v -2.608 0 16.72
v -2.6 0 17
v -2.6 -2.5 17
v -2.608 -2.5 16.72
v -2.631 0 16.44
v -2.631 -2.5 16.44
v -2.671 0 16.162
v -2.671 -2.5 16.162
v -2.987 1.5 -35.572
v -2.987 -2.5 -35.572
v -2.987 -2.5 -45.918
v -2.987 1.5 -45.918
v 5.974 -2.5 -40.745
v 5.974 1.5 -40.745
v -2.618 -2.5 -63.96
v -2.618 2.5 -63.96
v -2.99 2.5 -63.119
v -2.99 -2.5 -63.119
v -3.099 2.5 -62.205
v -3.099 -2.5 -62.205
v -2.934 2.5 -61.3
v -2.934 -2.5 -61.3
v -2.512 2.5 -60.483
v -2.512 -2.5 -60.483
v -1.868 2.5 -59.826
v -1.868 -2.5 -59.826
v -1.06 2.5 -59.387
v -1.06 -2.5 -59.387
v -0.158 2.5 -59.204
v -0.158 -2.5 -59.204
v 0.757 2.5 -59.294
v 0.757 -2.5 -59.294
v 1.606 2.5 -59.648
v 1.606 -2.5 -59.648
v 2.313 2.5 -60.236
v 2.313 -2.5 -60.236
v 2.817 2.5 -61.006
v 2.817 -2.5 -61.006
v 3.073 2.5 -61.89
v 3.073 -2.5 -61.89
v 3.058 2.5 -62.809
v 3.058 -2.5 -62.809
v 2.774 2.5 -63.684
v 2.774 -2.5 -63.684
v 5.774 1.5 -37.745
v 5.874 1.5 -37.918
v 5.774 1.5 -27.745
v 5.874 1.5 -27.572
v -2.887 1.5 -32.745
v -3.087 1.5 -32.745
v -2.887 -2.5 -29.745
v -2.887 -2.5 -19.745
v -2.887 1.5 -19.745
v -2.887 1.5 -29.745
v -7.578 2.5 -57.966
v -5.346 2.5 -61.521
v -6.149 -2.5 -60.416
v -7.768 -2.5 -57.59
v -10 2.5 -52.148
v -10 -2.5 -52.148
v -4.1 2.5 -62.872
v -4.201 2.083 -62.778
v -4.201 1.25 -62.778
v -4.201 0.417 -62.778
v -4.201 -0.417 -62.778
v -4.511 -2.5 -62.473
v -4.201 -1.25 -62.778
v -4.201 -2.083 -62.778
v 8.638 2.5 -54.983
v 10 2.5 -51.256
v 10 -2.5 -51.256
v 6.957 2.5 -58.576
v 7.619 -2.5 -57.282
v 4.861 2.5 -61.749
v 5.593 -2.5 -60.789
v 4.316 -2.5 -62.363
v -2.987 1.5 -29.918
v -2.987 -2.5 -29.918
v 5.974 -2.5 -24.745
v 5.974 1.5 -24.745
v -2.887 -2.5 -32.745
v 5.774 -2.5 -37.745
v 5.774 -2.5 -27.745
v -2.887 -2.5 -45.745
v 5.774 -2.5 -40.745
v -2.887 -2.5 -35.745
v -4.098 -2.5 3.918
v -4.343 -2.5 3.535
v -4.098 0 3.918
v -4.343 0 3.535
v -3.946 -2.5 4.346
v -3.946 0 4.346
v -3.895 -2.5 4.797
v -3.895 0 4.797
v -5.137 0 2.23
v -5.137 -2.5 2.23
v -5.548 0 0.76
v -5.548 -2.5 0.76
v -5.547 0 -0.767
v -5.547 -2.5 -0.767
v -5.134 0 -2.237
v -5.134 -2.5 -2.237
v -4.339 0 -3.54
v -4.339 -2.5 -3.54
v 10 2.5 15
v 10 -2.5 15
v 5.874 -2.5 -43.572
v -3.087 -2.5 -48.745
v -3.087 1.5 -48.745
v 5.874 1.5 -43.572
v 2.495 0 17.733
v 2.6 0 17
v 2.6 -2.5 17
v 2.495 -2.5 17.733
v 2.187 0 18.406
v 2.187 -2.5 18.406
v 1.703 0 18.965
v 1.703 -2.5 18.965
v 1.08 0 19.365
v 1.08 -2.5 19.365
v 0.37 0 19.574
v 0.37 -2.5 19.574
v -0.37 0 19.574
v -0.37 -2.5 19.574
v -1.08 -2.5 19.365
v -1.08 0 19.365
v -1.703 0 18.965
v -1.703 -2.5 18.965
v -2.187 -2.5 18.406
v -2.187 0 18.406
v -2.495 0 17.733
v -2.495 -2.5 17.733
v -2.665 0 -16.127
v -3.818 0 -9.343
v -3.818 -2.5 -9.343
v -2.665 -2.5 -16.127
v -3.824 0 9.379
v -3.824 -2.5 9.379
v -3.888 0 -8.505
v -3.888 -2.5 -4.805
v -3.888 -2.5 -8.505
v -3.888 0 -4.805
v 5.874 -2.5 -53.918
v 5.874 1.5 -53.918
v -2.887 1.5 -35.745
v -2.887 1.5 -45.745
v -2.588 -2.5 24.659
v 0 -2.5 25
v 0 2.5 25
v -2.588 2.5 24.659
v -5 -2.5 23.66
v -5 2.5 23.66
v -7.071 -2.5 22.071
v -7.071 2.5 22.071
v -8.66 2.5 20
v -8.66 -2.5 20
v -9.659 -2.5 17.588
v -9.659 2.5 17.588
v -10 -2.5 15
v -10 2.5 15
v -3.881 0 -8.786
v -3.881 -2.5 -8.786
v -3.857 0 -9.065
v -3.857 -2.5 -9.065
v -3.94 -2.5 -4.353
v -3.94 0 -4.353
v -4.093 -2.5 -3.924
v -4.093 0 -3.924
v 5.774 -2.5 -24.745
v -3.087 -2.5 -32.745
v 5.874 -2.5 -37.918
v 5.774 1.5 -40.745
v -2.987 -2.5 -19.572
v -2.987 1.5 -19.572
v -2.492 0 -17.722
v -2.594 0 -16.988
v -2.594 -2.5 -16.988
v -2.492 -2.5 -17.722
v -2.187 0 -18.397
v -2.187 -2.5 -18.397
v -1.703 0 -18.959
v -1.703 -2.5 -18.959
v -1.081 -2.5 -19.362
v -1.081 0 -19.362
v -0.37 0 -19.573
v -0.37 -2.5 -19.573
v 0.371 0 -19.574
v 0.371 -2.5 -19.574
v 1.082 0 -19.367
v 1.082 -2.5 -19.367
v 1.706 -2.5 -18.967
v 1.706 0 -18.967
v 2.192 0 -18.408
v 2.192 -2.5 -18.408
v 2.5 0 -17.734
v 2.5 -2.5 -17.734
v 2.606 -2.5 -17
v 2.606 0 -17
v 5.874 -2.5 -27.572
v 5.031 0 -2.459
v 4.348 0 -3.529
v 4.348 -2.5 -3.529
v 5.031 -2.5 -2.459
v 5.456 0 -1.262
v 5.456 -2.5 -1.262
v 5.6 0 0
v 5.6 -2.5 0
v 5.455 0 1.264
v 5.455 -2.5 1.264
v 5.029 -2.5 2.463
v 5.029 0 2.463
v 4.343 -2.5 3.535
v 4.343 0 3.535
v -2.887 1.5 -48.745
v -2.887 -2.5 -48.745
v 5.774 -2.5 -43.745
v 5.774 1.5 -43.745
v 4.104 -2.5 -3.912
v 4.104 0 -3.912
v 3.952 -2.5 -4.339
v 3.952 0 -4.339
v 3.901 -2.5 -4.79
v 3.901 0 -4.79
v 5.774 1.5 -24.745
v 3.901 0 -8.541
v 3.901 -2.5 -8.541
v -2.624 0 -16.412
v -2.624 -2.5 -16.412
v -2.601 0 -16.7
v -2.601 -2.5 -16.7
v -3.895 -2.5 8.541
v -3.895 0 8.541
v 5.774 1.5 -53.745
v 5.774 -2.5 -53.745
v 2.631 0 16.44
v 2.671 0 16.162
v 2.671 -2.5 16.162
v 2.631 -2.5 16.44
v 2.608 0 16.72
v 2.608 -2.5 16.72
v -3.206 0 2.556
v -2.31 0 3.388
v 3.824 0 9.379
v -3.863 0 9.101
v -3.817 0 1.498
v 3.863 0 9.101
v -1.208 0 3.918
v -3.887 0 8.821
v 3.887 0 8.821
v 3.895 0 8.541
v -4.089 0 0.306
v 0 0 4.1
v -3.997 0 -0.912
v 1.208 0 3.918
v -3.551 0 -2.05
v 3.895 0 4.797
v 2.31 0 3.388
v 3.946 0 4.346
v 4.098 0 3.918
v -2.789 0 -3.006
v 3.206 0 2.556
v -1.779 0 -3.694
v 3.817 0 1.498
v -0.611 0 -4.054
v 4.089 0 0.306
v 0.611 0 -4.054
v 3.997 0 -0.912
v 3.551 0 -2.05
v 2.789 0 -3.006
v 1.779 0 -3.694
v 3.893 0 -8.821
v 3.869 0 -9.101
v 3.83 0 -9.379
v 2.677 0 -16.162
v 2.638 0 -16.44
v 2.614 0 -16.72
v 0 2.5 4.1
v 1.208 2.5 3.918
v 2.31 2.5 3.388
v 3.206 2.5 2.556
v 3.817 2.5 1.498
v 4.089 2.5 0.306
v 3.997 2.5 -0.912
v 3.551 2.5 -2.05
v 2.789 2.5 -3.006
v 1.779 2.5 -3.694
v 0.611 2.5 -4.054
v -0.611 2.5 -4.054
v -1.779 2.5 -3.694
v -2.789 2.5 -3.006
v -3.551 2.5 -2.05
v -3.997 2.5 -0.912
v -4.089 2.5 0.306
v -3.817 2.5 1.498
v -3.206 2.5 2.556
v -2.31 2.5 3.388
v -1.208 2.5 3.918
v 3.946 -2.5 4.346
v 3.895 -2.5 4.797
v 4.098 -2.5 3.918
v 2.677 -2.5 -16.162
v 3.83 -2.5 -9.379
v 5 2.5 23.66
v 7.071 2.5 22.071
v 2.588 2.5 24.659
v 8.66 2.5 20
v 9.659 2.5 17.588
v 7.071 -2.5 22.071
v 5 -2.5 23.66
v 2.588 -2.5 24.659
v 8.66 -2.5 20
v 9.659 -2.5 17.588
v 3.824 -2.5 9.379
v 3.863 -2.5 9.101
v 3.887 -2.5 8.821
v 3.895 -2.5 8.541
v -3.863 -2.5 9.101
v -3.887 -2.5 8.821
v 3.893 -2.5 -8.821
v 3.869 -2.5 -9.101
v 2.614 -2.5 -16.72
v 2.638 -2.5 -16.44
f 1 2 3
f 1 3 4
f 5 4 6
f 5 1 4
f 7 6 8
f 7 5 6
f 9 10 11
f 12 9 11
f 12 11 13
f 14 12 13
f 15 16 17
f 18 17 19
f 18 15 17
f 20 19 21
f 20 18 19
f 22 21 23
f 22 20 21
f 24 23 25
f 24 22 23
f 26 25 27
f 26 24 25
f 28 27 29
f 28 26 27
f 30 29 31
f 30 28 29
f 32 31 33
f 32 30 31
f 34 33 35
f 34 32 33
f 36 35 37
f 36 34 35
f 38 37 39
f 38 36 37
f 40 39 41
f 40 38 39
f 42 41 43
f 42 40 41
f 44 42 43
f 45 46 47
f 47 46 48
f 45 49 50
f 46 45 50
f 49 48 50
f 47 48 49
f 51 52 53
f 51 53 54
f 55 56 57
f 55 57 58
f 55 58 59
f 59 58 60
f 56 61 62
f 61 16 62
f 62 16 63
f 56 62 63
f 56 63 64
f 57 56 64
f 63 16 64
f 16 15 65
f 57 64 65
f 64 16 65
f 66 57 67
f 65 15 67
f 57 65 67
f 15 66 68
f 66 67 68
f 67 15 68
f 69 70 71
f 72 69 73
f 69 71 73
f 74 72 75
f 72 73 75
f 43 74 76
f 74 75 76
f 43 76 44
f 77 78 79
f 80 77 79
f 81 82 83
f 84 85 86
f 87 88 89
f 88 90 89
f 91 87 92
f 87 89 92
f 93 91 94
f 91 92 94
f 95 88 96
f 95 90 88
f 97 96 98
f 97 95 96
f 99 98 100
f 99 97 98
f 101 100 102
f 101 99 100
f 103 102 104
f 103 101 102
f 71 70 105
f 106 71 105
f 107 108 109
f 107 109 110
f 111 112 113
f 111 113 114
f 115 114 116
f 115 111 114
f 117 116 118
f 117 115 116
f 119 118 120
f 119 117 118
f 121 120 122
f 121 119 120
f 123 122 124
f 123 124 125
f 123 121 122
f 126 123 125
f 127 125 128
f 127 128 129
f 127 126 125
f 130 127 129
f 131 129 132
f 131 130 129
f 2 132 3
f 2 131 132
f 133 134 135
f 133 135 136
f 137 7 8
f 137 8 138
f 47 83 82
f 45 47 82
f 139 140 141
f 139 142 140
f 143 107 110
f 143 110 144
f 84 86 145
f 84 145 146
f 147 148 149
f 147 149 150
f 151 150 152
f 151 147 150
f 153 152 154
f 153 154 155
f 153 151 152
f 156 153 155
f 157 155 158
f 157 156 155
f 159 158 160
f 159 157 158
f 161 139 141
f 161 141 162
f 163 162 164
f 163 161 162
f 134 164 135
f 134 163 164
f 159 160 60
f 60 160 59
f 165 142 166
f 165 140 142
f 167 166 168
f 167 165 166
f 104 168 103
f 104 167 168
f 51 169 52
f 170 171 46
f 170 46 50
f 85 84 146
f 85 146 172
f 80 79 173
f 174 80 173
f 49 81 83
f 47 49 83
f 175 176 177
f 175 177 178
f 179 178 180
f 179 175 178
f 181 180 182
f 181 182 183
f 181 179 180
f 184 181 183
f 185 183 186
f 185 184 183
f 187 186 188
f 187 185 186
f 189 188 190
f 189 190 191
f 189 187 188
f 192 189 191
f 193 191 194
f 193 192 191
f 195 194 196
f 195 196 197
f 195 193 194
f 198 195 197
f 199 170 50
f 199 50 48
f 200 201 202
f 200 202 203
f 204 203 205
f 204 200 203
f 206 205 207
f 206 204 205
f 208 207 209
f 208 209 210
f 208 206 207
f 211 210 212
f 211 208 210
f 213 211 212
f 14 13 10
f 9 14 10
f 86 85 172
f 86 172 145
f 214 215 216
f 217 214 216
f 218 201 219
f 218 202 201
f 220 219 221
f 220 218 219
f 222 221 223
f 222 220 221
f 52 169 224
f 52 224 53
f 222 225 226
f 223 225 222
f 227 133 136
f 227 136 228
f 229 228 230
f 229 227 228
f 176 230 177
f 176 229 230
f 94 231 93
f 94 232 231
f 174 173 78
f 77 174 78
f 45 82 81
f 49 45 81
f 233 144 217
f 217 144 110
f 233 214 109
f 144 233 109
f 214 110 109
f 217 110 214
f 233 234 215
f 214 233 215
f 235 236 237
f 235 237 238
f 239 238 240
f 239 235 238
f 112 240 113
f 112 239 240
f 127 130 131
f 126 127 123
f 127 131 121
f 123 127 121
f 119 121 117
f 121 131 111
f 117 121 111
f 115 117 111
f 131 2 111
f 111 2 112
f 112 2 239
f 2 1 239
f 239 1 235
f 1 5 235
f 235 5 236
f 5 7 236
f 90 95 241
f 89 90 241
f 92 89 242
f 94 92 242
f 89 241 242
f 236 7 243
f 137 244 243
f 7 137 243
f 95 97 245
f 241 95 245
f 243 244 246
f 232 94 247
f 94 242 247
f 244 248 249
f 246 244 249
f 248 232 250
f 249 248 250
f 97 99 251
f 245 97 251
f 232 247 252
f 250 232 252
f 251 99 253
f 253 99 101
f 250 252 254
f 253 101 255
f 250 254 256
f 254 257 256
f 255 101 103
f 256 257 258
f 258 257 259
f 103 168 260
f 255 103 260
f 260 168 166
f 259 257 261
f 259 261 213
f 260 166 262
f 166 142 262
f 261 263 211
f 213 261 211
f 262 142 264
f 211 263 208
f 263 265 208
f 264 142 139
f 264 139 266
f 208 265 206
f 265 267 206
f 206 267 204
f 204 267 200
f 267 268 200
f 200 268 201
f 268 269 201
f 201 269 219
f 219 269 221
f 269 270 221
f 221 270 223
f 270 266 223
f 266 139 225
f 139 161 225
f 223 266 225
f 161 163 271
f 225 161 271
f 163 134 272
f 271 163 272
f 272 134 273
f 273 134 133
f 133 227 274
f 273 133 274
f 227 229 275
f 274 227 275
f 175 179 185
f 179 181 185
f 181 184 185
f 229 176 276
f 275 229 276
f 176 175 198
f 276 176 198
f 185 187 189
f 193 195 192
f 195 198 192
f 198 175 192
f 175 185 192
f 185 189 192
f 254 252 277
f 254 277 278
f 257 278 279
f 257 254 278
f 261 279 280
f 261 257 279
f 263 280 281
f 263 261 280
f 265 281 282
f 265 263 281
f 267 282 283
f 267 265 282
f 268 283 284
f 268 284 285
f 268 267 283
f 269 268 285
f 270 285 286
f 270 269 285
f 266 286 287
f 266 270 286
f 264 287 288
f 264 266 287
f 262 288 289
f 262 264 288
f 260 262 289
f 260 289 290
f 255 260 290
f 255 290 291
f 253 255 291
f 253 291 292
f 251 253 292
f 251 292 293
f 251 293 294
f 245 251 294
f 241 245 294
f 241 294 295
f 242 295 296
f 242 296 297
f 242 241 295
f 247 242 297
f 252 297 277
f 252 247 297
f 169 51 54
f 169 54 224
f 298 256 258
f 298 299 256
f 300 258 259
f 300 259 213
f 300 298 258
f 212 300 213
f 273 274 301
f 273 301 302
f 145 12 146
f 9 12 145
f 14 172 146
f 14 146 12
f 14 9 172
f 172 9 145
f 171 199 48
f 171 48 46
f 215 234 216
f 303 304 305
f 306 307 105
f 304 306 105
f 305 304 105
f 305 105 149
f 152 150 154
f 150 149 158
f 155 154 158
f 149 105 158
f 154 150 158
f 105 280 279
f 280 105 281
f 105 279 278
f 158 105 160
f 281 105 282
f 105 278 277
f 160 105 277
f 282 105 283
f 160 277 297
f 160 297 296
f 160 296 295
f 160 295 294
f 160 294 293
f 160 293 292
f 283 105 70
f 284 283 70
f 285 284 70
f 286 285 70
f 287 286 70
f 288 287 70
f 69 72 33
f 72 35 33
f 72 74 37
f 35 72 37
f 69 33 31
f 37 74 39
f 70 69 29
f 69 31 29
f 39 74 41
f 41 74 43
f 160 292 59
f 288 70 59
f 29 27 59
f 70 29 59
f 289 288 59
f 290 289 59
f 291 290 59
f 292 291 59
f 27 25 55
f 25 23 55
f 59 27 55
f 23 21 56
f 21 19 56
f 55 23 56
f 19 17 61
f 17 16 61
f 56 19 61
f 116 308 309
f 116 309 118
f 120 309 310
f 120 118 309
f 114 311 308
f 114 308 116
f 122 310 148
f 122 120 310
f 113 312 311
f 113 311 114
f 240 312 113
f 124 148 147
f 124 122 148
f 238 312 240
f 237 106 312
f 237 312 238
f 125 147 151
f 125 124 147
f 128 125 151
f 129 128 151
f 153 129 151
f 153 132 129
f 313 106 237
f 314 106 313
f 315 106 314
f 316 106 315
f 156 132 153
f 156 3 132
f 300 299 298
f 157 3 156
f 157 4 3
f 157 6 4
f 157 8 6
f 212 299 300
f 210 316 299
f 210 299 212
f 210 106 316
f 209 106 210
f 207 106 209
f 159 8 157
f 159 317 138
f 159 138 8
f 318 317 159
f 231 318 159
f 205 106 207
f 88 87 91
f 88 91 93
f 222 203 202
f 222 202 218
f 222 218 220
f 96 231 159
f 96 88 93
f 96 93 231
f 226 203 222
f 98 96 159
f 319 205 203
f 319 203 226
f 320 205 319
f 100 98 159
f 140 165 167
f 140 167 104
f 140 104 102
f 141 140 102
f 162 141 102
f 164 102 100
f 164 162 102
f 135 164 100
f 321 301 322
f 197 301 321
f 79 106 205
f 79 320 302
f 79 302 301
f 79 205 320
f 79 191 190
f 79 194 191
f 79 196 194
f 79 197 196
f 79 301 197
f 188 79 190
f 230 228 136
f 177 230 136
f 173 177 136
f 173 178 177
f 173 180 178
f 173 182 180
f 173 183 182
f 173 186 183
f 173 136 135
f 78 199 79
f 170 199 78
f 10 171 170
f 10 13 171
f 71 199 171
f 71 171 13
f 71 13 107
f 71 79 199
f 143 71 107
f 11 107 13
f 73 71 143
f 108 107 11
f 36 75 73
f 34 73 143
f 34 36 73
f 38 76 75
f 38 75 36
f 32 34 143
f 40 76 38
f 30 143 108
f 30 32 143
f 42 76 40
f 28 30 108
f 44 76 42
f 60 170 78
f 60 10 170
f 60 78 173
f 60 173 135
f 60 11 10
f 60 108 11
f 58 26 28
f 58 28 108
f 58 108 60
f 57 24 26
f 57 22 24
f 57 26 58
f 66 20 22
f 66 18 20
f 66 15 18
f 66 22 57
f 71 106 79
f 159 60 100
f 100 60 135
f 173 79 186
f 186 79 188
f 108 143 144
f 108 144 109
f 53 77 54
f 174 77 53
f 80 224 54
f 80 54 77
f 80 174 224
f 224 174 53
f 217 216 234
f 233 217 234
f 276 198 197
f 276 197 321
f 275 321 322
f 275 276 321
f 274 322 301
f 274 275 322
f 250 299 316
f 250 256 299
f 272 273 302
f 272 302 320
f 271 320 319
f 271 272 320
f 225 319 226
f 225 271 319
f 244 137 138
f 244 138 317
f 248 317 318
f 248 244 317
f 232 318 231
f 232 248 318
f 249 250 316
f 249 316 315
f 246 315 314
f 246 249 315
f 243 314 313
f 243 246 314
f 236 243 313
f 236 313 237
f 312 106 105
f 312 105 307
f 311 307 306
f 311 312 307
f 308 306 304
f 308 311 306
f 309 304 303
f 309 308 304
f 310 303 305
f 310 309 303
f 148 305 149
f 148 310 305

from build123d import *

# Parameters (mm, degrees)
SKETCH1_W           = 15
SKETCH1_H           = 45
BOSS_EXTRUDE1_DEPTH = 2.2
SKETCH1_3_W         = 20
SKETCH1_3_H         = 50
SKETCH1_3_W_2       = 15
SKETCH1_3_H_2       = 45
BOSS_EXTRUDE2_DEPTH = 2.5
SKETCH1_4_W         = 20
SKETCH1_4_H         = 50
SKETCH1_4_R         = 4.1
BOSS_EXTRUDE3_DEPTH = 2.5
FILLET1_R           = 2
SKETCH1_5_R         = 3.1
BOSS_EXTRUDE4_DEPTH = 2.5
FILLET2_R           = 10
CUT_EXTRUDE2_DEPTH  = 4
SKETCH3_OUTSIDE_W   = 41.892
SKETCH3_OUTSIDE_H   = 119.192
CUT_EXTRUDE3_DEPTH  = 74.159346635


with BuildPart() as part:
    # Sketch1 → Boss-Extrude1 (new body)
    with BuildSketch(Plane(origin=(0, 0, 0), x_dir=(1, 0, 0), z_dir=(0, 1, 0))):
        Rectangle(SKETCH1_W, SKETCH1_H)
        with BuildLine():
            ThreePointArc((-3.894544437, -4.023993492), (-5.599998379, 0.004260474), (-3.88841703, 4.029914763))
            Line((-3.88841703, 4.029914763), (-3.88841703, 8.505312122))
            ThreePointArc((-3.88841703, 8.505312122), (-3.870707724, 8.925763598), (-3.817705253, 9.343236712))
            Line((-3.817705253, 9.343236712), (-2.664584371, 16.126741161))
            ThreePointArc((-2.664584371, 16.126741161), (-2.610617779, 16.555799687), (-2.593926654, 16.987916591))
            ThreePointArc((-2.593926654, 16.987916591), (0, 19.6), (2.606045235, 17.000007028))
            ThreePointArc((2.606045235, 17.000007028), (2.623754541, 16.579555552), (2.676757012, 16.162082438))
            Line((2.676757012, 16.162082438), (3.829877895, 9.378577989))
            ThreePointArc((3.829877895, 9.378577989), (3.882880366, 8.961104875), (3.900589672, 8.540653399))
            Line((3.900589672, 8.540653399), (3.900589672, 4.018133922))
            ThreePointArc((3.900589672, 4.018133922), (5.157678846, 2.181364004), (5.6, 0))
            ThreePointArc((5.6, 0), (5.156037667, -2.185240393), (3.894544437, -4.023993492))
            Line((3.894544437, -4.023993492), (3.894544437, -8.540646372))
            ThreePointArc((3.894544437, -8.540646372), (3.876835131, -8.961097847), (3.82383266, -9.378570962))
            Line((3.82383266, -9.378570962), (2.670711777, -16.16207541))
            ThreePointArc((2.670711777, -16.16207541), (2.617709306, -16.579548524), (2.6, -17))
            ThreePointArc((2.6, -17), (0, -19.6), (-2.6, -17))
            ThreePointArc((-2.6, -17), (-2.617709306, -16.579548524), (-2.670711777, -16.16207541))
            Line((-2.670711777, -16.16207541), (-3.82383266, -9.378570962))
            ThreePointArc((-3.82383266, -9.378570962), (-3.876835131, -8.961097847), (-3.894544437, -8.540646372))
            Line((-3.894544437, -8.540646372), (-3.894544437, -4.023993492))
        make_face(mode=Mode.SUBTRACT)
    extrude(amount=-BOSS_EXTRUDE1_DEPTH)

    # Sketch1<3> → Boss-Extrude2 (add)
    # profile 1 of 2: a face of its own
    with BuildSketch(Plane(origin=(0, 0, 0), x_dir=(1, 0, 0), z_dir=(0, 1, 0))):
        Rectangle(SKETCH1_3_W, SKETCH1_3_H)
        Rectangle(SKETCH1_3_W_2, SKETCH1_3_H_2, mode=Mode.SUBTRACT)
    # profile 2 of 2: a face of its own
    with BuildSketch(Plane(origin=(0, 0, 0), x_dir=(1, 0, 0), z_dir=(0, 1, 0))):
        Rectangle(SKETCH1_3_W_2, SKETCH1_3_H_2)
        with BuildLine():
            ThreePointArc((-3.894544437, -4.023993492), (-5.599998379, 0.004260474), (-3.88841703, 4.029914763))
            Line((-3.88841703, 4.029914763), (-3.88841703, 8.505312122))
            ThreePointArc((-3.88841703, 8.505312122), (-3.870707724, 8.925763598), (-3.817705253, 9.343236712))
            Line((-3.817705253, 9.343236712), (-2.664584371, 16.126741161))
            ThreePointArc((-2.664584371, 16.126741161), (-2.610617779, 16.555799687), (-2.593926654, 16.987916591))
            ThreePointArc((-2.593926654, 16.987916591), (0, 19.6), (2.606045235, 17.000007028))
            ThreePointArc((2.606045235, 17.000007028), (2.623754541, 16.579555552), (2.676757012, 16.162082438))
            Line((2.676757012, 16.162082438), (3.829877895, 9.378577989))
            ThreePointArc((3.829877895, 9.378577989), (3.882880366, 8.961104875), (3.900589672, 8.540653399))
            Line((3.900589672, 8.540653399), (3.900589672, 4.018133922))
            ThreePointArc((3.900589672, 4.018133922), (5.157678846, 2.181364004), (5.6, 0))
            ThreePointArc((5.6, 0), (5.156037667, -2.185240393), (3.894544437, -4.023993492))
            Line((3.894544437, -4.023993492), (3.894544437, -8.540646372))
            ThreePointArc((3.894544437, -8.540646372), (3.876835131, -8.961097847), (3.82383266, -9.378570962))
            Line((3.82383266, -9.378570962), (2.670711777, -16.16207541))
            ThreePointArc((2.670711777, -16.16207541), (2.617709306, -16.579548524), (2.6, -17))
            ThreePointArc((2.6, -17), (0, -19.6), (-2.6, -17))
            ThreePointArc((-2.6, -17), (-2.617709306, -16.579548524), (-2.670711777, -16.16207541))
            Line((-2.670711777, -16.16207541), (-3.82383266, -9.378570962))
            ThreePointArc((-3.82383266, -9.378570962), (-3.876835131, -8.961097847), (-3.894544437, -8.540646372))
            Line((-3.894544437, -8.540646372), (-3.894544437, -4.023993492))
        make_face(mode=Mode.SUBTRACT)
    extrude(amount=-BOSS_EXTRUDE2_DEPTH)

    # Sketch1<4> → Boss-Extrude3 (add)
    with BuildSketch(Plane(origin=(0, 0, 0), x_dir=(1, 0, 0), z_dir=(0, 1, 0))):
        Rectangle(SKETCH1_4_W, SKETCH1_4_H)
        with Locations(Location((0, 0, 0), (0, 0, 270))):
            Circle(SKETCH1_4_R, mode=Mode.SUBTRACT)
    extrude(amount=BOSS_EXTRUDE3_DEPTH)

    # Fillet1
    fillet1_edges = [part.edges().sort_by_distance(p)[0] for p in [
        (-3.88841703, -1.25, -4.029914763),
        (-3.894544437, -1.25, 4.023993492),
        (3.894544437, -1.25, 4.023993492),
        (3.900589672, -1.25, -4.018133922),
    ]]
    fillet(fillet1_edges, radius=FILLET1_R)

    # Sketch1<5> → Boss-Extrude4 (add, symmetric)
    with BuildSketch(Plane(origin=(0, 0, 0), x_dir=(1, 0, 0), z_dir=(0, 1, 0))):
        with BuildLine():
            ThreePointArc((-10, 62.3), (0, 72.3), (10, 62.3))
            Line((10, 62.3), (10, 25))
            Line((10, 25), (-10, 25))
            Line((-10, 25), (-10, 62.3))
        make_face()
        with Locations(Location((0, 62.3, 0), (0, 0, 270))):
            Circle(SKETCH1_5_R, mode=Mode.SUBTRACT)
    extrude(amount=BOSS_EXTRUDE4_DEPTH, both=True)

    # Fillet2
    fillet2_edges = [part.edges().sort_by_distance(p)[0] for p in [
        (10, 0, 25),
        (-10, 0, 25),
    ]]
    fillet(fillet2_edges, radius=FILLET2_R - 0.0001)  # a hair under: the kernel refuses the full size

    # Sketch2 → Cut-Extrude2 (cut)
    # profile 1 of 4: a face of its own
    with BuildSketch(Plane.XZ.offset(2.5)):
        Polygon((5.973502692, -40.744870683), (-2.986751346, -35.571665602), (-2.986751346, -45.918075763), align=None)
        Polygon((5.773502692, -40.744870683), (-2.886751346, -35.744870683), (-2.886751346, -45.744870683), align=None, mode=Mode.SUBTRACT)
    # profile 2 of 4: a face of its own
    with BuildSketch(Plane.XZ.offset(2.5)):
        Polygon((5.973502692, -24.744870683), (-2.986751346, -19.571665602), (-2.986751346, -29.918075763), align=None)
        Polygon((5.773502692, -24.744870683), (-2.886751346, -19.744870683), (-2.886751346, -29.744870683), align=None, mode=Mode.SUBTRACT)
    # profile 3 of 4: a face of its own
    with BuildSketch(Plane.XZ.offset(2.5)):
        Polygon((-3.086751346, -48.744870683), (5.873502692, -43.571665602), (5.873502692, -53.918075763), align=None)
        Polygon((5.773502692, -53.744870683), (-2.886751346, -48.744870683), (5.773502692, -43.744870683), align=None, mode=Mode.SUBTRACT)
    # profile 4 of 4: a face of its own
    with BuildSketch(Plane.XZ.offset(2.5)):
        Polygon((-3.086751346, -32.744870683), (5.873502692, -27.571665602), (5.873502692, -37.918075763), align=None)
        Polygon((5.773502692, -37.744870683), (-2.886751346, -32.744870683), (5.773502692, -27.744870683), align=None, mode=Mode.SUBTRACT)
    extrude(amount=-CUT_EXTRUDE2_DEPTH, mode=Mode.SUBTRACT)

    # Sketch3 outside → Cut-Extrude3 (cut, through all)
    with BuildSketch(Plane.XZ.offset(2.5)):
        with Locations((0, -23.65)):
            Rectangle(SKETCH3_OUTSIDE_W, SKETCH3_OUTSIDE_H)
        with BuildLine():
            Line((10, -51.256214284), (10, 15))
            ThreePointArc((10, 15), (7.071067812, 22.071067812), (0, 25))
            ThreePointArc((0, 25), (-7.071067812, 22.071067812), (-10, 15))
            Line((-10, 15), (-10, -52.147572729))
            add(Edge.make_bspline(
                [(10, -51.256214284), (9.785135746, -51.909968828), (9.078957117, -53.953043182), (7.795150781, -57.091457155), (6.013003778, -60.33910848), (4.122796637, -62.728314915), (2.078800951, -64.258582197), (-0.15, -64.79554013), (-2.378800951, -64.258582197), (-4.422796637, -62.728314915), (-6.313003778, -60.33910848), (-8.095150781, -57.091457155), (-9.260115035, -54.243566479), (-9.877905488, -52.501784004), (-10, -52.147572729)],
                knots=[0.471097659, 0.471097659, 0.471097659, 0.471097659, 0.474472001, 0.481696232, 0.487703698, 0.492583405, 0.496543603, 0.5, 0.503456397, 0.507416595, 0.512296302, 0.518303768, 0.525527999, 0.527365119, 0.527365119, 0.527365119, 0.527365119], degree=3))
        make_face(mode=Mode.SUBTRACT)
    extrude(amount=-CUT_EXTRUDE3_DEPTH, mode=Mode.SUBTRACT)


solid = part.part
